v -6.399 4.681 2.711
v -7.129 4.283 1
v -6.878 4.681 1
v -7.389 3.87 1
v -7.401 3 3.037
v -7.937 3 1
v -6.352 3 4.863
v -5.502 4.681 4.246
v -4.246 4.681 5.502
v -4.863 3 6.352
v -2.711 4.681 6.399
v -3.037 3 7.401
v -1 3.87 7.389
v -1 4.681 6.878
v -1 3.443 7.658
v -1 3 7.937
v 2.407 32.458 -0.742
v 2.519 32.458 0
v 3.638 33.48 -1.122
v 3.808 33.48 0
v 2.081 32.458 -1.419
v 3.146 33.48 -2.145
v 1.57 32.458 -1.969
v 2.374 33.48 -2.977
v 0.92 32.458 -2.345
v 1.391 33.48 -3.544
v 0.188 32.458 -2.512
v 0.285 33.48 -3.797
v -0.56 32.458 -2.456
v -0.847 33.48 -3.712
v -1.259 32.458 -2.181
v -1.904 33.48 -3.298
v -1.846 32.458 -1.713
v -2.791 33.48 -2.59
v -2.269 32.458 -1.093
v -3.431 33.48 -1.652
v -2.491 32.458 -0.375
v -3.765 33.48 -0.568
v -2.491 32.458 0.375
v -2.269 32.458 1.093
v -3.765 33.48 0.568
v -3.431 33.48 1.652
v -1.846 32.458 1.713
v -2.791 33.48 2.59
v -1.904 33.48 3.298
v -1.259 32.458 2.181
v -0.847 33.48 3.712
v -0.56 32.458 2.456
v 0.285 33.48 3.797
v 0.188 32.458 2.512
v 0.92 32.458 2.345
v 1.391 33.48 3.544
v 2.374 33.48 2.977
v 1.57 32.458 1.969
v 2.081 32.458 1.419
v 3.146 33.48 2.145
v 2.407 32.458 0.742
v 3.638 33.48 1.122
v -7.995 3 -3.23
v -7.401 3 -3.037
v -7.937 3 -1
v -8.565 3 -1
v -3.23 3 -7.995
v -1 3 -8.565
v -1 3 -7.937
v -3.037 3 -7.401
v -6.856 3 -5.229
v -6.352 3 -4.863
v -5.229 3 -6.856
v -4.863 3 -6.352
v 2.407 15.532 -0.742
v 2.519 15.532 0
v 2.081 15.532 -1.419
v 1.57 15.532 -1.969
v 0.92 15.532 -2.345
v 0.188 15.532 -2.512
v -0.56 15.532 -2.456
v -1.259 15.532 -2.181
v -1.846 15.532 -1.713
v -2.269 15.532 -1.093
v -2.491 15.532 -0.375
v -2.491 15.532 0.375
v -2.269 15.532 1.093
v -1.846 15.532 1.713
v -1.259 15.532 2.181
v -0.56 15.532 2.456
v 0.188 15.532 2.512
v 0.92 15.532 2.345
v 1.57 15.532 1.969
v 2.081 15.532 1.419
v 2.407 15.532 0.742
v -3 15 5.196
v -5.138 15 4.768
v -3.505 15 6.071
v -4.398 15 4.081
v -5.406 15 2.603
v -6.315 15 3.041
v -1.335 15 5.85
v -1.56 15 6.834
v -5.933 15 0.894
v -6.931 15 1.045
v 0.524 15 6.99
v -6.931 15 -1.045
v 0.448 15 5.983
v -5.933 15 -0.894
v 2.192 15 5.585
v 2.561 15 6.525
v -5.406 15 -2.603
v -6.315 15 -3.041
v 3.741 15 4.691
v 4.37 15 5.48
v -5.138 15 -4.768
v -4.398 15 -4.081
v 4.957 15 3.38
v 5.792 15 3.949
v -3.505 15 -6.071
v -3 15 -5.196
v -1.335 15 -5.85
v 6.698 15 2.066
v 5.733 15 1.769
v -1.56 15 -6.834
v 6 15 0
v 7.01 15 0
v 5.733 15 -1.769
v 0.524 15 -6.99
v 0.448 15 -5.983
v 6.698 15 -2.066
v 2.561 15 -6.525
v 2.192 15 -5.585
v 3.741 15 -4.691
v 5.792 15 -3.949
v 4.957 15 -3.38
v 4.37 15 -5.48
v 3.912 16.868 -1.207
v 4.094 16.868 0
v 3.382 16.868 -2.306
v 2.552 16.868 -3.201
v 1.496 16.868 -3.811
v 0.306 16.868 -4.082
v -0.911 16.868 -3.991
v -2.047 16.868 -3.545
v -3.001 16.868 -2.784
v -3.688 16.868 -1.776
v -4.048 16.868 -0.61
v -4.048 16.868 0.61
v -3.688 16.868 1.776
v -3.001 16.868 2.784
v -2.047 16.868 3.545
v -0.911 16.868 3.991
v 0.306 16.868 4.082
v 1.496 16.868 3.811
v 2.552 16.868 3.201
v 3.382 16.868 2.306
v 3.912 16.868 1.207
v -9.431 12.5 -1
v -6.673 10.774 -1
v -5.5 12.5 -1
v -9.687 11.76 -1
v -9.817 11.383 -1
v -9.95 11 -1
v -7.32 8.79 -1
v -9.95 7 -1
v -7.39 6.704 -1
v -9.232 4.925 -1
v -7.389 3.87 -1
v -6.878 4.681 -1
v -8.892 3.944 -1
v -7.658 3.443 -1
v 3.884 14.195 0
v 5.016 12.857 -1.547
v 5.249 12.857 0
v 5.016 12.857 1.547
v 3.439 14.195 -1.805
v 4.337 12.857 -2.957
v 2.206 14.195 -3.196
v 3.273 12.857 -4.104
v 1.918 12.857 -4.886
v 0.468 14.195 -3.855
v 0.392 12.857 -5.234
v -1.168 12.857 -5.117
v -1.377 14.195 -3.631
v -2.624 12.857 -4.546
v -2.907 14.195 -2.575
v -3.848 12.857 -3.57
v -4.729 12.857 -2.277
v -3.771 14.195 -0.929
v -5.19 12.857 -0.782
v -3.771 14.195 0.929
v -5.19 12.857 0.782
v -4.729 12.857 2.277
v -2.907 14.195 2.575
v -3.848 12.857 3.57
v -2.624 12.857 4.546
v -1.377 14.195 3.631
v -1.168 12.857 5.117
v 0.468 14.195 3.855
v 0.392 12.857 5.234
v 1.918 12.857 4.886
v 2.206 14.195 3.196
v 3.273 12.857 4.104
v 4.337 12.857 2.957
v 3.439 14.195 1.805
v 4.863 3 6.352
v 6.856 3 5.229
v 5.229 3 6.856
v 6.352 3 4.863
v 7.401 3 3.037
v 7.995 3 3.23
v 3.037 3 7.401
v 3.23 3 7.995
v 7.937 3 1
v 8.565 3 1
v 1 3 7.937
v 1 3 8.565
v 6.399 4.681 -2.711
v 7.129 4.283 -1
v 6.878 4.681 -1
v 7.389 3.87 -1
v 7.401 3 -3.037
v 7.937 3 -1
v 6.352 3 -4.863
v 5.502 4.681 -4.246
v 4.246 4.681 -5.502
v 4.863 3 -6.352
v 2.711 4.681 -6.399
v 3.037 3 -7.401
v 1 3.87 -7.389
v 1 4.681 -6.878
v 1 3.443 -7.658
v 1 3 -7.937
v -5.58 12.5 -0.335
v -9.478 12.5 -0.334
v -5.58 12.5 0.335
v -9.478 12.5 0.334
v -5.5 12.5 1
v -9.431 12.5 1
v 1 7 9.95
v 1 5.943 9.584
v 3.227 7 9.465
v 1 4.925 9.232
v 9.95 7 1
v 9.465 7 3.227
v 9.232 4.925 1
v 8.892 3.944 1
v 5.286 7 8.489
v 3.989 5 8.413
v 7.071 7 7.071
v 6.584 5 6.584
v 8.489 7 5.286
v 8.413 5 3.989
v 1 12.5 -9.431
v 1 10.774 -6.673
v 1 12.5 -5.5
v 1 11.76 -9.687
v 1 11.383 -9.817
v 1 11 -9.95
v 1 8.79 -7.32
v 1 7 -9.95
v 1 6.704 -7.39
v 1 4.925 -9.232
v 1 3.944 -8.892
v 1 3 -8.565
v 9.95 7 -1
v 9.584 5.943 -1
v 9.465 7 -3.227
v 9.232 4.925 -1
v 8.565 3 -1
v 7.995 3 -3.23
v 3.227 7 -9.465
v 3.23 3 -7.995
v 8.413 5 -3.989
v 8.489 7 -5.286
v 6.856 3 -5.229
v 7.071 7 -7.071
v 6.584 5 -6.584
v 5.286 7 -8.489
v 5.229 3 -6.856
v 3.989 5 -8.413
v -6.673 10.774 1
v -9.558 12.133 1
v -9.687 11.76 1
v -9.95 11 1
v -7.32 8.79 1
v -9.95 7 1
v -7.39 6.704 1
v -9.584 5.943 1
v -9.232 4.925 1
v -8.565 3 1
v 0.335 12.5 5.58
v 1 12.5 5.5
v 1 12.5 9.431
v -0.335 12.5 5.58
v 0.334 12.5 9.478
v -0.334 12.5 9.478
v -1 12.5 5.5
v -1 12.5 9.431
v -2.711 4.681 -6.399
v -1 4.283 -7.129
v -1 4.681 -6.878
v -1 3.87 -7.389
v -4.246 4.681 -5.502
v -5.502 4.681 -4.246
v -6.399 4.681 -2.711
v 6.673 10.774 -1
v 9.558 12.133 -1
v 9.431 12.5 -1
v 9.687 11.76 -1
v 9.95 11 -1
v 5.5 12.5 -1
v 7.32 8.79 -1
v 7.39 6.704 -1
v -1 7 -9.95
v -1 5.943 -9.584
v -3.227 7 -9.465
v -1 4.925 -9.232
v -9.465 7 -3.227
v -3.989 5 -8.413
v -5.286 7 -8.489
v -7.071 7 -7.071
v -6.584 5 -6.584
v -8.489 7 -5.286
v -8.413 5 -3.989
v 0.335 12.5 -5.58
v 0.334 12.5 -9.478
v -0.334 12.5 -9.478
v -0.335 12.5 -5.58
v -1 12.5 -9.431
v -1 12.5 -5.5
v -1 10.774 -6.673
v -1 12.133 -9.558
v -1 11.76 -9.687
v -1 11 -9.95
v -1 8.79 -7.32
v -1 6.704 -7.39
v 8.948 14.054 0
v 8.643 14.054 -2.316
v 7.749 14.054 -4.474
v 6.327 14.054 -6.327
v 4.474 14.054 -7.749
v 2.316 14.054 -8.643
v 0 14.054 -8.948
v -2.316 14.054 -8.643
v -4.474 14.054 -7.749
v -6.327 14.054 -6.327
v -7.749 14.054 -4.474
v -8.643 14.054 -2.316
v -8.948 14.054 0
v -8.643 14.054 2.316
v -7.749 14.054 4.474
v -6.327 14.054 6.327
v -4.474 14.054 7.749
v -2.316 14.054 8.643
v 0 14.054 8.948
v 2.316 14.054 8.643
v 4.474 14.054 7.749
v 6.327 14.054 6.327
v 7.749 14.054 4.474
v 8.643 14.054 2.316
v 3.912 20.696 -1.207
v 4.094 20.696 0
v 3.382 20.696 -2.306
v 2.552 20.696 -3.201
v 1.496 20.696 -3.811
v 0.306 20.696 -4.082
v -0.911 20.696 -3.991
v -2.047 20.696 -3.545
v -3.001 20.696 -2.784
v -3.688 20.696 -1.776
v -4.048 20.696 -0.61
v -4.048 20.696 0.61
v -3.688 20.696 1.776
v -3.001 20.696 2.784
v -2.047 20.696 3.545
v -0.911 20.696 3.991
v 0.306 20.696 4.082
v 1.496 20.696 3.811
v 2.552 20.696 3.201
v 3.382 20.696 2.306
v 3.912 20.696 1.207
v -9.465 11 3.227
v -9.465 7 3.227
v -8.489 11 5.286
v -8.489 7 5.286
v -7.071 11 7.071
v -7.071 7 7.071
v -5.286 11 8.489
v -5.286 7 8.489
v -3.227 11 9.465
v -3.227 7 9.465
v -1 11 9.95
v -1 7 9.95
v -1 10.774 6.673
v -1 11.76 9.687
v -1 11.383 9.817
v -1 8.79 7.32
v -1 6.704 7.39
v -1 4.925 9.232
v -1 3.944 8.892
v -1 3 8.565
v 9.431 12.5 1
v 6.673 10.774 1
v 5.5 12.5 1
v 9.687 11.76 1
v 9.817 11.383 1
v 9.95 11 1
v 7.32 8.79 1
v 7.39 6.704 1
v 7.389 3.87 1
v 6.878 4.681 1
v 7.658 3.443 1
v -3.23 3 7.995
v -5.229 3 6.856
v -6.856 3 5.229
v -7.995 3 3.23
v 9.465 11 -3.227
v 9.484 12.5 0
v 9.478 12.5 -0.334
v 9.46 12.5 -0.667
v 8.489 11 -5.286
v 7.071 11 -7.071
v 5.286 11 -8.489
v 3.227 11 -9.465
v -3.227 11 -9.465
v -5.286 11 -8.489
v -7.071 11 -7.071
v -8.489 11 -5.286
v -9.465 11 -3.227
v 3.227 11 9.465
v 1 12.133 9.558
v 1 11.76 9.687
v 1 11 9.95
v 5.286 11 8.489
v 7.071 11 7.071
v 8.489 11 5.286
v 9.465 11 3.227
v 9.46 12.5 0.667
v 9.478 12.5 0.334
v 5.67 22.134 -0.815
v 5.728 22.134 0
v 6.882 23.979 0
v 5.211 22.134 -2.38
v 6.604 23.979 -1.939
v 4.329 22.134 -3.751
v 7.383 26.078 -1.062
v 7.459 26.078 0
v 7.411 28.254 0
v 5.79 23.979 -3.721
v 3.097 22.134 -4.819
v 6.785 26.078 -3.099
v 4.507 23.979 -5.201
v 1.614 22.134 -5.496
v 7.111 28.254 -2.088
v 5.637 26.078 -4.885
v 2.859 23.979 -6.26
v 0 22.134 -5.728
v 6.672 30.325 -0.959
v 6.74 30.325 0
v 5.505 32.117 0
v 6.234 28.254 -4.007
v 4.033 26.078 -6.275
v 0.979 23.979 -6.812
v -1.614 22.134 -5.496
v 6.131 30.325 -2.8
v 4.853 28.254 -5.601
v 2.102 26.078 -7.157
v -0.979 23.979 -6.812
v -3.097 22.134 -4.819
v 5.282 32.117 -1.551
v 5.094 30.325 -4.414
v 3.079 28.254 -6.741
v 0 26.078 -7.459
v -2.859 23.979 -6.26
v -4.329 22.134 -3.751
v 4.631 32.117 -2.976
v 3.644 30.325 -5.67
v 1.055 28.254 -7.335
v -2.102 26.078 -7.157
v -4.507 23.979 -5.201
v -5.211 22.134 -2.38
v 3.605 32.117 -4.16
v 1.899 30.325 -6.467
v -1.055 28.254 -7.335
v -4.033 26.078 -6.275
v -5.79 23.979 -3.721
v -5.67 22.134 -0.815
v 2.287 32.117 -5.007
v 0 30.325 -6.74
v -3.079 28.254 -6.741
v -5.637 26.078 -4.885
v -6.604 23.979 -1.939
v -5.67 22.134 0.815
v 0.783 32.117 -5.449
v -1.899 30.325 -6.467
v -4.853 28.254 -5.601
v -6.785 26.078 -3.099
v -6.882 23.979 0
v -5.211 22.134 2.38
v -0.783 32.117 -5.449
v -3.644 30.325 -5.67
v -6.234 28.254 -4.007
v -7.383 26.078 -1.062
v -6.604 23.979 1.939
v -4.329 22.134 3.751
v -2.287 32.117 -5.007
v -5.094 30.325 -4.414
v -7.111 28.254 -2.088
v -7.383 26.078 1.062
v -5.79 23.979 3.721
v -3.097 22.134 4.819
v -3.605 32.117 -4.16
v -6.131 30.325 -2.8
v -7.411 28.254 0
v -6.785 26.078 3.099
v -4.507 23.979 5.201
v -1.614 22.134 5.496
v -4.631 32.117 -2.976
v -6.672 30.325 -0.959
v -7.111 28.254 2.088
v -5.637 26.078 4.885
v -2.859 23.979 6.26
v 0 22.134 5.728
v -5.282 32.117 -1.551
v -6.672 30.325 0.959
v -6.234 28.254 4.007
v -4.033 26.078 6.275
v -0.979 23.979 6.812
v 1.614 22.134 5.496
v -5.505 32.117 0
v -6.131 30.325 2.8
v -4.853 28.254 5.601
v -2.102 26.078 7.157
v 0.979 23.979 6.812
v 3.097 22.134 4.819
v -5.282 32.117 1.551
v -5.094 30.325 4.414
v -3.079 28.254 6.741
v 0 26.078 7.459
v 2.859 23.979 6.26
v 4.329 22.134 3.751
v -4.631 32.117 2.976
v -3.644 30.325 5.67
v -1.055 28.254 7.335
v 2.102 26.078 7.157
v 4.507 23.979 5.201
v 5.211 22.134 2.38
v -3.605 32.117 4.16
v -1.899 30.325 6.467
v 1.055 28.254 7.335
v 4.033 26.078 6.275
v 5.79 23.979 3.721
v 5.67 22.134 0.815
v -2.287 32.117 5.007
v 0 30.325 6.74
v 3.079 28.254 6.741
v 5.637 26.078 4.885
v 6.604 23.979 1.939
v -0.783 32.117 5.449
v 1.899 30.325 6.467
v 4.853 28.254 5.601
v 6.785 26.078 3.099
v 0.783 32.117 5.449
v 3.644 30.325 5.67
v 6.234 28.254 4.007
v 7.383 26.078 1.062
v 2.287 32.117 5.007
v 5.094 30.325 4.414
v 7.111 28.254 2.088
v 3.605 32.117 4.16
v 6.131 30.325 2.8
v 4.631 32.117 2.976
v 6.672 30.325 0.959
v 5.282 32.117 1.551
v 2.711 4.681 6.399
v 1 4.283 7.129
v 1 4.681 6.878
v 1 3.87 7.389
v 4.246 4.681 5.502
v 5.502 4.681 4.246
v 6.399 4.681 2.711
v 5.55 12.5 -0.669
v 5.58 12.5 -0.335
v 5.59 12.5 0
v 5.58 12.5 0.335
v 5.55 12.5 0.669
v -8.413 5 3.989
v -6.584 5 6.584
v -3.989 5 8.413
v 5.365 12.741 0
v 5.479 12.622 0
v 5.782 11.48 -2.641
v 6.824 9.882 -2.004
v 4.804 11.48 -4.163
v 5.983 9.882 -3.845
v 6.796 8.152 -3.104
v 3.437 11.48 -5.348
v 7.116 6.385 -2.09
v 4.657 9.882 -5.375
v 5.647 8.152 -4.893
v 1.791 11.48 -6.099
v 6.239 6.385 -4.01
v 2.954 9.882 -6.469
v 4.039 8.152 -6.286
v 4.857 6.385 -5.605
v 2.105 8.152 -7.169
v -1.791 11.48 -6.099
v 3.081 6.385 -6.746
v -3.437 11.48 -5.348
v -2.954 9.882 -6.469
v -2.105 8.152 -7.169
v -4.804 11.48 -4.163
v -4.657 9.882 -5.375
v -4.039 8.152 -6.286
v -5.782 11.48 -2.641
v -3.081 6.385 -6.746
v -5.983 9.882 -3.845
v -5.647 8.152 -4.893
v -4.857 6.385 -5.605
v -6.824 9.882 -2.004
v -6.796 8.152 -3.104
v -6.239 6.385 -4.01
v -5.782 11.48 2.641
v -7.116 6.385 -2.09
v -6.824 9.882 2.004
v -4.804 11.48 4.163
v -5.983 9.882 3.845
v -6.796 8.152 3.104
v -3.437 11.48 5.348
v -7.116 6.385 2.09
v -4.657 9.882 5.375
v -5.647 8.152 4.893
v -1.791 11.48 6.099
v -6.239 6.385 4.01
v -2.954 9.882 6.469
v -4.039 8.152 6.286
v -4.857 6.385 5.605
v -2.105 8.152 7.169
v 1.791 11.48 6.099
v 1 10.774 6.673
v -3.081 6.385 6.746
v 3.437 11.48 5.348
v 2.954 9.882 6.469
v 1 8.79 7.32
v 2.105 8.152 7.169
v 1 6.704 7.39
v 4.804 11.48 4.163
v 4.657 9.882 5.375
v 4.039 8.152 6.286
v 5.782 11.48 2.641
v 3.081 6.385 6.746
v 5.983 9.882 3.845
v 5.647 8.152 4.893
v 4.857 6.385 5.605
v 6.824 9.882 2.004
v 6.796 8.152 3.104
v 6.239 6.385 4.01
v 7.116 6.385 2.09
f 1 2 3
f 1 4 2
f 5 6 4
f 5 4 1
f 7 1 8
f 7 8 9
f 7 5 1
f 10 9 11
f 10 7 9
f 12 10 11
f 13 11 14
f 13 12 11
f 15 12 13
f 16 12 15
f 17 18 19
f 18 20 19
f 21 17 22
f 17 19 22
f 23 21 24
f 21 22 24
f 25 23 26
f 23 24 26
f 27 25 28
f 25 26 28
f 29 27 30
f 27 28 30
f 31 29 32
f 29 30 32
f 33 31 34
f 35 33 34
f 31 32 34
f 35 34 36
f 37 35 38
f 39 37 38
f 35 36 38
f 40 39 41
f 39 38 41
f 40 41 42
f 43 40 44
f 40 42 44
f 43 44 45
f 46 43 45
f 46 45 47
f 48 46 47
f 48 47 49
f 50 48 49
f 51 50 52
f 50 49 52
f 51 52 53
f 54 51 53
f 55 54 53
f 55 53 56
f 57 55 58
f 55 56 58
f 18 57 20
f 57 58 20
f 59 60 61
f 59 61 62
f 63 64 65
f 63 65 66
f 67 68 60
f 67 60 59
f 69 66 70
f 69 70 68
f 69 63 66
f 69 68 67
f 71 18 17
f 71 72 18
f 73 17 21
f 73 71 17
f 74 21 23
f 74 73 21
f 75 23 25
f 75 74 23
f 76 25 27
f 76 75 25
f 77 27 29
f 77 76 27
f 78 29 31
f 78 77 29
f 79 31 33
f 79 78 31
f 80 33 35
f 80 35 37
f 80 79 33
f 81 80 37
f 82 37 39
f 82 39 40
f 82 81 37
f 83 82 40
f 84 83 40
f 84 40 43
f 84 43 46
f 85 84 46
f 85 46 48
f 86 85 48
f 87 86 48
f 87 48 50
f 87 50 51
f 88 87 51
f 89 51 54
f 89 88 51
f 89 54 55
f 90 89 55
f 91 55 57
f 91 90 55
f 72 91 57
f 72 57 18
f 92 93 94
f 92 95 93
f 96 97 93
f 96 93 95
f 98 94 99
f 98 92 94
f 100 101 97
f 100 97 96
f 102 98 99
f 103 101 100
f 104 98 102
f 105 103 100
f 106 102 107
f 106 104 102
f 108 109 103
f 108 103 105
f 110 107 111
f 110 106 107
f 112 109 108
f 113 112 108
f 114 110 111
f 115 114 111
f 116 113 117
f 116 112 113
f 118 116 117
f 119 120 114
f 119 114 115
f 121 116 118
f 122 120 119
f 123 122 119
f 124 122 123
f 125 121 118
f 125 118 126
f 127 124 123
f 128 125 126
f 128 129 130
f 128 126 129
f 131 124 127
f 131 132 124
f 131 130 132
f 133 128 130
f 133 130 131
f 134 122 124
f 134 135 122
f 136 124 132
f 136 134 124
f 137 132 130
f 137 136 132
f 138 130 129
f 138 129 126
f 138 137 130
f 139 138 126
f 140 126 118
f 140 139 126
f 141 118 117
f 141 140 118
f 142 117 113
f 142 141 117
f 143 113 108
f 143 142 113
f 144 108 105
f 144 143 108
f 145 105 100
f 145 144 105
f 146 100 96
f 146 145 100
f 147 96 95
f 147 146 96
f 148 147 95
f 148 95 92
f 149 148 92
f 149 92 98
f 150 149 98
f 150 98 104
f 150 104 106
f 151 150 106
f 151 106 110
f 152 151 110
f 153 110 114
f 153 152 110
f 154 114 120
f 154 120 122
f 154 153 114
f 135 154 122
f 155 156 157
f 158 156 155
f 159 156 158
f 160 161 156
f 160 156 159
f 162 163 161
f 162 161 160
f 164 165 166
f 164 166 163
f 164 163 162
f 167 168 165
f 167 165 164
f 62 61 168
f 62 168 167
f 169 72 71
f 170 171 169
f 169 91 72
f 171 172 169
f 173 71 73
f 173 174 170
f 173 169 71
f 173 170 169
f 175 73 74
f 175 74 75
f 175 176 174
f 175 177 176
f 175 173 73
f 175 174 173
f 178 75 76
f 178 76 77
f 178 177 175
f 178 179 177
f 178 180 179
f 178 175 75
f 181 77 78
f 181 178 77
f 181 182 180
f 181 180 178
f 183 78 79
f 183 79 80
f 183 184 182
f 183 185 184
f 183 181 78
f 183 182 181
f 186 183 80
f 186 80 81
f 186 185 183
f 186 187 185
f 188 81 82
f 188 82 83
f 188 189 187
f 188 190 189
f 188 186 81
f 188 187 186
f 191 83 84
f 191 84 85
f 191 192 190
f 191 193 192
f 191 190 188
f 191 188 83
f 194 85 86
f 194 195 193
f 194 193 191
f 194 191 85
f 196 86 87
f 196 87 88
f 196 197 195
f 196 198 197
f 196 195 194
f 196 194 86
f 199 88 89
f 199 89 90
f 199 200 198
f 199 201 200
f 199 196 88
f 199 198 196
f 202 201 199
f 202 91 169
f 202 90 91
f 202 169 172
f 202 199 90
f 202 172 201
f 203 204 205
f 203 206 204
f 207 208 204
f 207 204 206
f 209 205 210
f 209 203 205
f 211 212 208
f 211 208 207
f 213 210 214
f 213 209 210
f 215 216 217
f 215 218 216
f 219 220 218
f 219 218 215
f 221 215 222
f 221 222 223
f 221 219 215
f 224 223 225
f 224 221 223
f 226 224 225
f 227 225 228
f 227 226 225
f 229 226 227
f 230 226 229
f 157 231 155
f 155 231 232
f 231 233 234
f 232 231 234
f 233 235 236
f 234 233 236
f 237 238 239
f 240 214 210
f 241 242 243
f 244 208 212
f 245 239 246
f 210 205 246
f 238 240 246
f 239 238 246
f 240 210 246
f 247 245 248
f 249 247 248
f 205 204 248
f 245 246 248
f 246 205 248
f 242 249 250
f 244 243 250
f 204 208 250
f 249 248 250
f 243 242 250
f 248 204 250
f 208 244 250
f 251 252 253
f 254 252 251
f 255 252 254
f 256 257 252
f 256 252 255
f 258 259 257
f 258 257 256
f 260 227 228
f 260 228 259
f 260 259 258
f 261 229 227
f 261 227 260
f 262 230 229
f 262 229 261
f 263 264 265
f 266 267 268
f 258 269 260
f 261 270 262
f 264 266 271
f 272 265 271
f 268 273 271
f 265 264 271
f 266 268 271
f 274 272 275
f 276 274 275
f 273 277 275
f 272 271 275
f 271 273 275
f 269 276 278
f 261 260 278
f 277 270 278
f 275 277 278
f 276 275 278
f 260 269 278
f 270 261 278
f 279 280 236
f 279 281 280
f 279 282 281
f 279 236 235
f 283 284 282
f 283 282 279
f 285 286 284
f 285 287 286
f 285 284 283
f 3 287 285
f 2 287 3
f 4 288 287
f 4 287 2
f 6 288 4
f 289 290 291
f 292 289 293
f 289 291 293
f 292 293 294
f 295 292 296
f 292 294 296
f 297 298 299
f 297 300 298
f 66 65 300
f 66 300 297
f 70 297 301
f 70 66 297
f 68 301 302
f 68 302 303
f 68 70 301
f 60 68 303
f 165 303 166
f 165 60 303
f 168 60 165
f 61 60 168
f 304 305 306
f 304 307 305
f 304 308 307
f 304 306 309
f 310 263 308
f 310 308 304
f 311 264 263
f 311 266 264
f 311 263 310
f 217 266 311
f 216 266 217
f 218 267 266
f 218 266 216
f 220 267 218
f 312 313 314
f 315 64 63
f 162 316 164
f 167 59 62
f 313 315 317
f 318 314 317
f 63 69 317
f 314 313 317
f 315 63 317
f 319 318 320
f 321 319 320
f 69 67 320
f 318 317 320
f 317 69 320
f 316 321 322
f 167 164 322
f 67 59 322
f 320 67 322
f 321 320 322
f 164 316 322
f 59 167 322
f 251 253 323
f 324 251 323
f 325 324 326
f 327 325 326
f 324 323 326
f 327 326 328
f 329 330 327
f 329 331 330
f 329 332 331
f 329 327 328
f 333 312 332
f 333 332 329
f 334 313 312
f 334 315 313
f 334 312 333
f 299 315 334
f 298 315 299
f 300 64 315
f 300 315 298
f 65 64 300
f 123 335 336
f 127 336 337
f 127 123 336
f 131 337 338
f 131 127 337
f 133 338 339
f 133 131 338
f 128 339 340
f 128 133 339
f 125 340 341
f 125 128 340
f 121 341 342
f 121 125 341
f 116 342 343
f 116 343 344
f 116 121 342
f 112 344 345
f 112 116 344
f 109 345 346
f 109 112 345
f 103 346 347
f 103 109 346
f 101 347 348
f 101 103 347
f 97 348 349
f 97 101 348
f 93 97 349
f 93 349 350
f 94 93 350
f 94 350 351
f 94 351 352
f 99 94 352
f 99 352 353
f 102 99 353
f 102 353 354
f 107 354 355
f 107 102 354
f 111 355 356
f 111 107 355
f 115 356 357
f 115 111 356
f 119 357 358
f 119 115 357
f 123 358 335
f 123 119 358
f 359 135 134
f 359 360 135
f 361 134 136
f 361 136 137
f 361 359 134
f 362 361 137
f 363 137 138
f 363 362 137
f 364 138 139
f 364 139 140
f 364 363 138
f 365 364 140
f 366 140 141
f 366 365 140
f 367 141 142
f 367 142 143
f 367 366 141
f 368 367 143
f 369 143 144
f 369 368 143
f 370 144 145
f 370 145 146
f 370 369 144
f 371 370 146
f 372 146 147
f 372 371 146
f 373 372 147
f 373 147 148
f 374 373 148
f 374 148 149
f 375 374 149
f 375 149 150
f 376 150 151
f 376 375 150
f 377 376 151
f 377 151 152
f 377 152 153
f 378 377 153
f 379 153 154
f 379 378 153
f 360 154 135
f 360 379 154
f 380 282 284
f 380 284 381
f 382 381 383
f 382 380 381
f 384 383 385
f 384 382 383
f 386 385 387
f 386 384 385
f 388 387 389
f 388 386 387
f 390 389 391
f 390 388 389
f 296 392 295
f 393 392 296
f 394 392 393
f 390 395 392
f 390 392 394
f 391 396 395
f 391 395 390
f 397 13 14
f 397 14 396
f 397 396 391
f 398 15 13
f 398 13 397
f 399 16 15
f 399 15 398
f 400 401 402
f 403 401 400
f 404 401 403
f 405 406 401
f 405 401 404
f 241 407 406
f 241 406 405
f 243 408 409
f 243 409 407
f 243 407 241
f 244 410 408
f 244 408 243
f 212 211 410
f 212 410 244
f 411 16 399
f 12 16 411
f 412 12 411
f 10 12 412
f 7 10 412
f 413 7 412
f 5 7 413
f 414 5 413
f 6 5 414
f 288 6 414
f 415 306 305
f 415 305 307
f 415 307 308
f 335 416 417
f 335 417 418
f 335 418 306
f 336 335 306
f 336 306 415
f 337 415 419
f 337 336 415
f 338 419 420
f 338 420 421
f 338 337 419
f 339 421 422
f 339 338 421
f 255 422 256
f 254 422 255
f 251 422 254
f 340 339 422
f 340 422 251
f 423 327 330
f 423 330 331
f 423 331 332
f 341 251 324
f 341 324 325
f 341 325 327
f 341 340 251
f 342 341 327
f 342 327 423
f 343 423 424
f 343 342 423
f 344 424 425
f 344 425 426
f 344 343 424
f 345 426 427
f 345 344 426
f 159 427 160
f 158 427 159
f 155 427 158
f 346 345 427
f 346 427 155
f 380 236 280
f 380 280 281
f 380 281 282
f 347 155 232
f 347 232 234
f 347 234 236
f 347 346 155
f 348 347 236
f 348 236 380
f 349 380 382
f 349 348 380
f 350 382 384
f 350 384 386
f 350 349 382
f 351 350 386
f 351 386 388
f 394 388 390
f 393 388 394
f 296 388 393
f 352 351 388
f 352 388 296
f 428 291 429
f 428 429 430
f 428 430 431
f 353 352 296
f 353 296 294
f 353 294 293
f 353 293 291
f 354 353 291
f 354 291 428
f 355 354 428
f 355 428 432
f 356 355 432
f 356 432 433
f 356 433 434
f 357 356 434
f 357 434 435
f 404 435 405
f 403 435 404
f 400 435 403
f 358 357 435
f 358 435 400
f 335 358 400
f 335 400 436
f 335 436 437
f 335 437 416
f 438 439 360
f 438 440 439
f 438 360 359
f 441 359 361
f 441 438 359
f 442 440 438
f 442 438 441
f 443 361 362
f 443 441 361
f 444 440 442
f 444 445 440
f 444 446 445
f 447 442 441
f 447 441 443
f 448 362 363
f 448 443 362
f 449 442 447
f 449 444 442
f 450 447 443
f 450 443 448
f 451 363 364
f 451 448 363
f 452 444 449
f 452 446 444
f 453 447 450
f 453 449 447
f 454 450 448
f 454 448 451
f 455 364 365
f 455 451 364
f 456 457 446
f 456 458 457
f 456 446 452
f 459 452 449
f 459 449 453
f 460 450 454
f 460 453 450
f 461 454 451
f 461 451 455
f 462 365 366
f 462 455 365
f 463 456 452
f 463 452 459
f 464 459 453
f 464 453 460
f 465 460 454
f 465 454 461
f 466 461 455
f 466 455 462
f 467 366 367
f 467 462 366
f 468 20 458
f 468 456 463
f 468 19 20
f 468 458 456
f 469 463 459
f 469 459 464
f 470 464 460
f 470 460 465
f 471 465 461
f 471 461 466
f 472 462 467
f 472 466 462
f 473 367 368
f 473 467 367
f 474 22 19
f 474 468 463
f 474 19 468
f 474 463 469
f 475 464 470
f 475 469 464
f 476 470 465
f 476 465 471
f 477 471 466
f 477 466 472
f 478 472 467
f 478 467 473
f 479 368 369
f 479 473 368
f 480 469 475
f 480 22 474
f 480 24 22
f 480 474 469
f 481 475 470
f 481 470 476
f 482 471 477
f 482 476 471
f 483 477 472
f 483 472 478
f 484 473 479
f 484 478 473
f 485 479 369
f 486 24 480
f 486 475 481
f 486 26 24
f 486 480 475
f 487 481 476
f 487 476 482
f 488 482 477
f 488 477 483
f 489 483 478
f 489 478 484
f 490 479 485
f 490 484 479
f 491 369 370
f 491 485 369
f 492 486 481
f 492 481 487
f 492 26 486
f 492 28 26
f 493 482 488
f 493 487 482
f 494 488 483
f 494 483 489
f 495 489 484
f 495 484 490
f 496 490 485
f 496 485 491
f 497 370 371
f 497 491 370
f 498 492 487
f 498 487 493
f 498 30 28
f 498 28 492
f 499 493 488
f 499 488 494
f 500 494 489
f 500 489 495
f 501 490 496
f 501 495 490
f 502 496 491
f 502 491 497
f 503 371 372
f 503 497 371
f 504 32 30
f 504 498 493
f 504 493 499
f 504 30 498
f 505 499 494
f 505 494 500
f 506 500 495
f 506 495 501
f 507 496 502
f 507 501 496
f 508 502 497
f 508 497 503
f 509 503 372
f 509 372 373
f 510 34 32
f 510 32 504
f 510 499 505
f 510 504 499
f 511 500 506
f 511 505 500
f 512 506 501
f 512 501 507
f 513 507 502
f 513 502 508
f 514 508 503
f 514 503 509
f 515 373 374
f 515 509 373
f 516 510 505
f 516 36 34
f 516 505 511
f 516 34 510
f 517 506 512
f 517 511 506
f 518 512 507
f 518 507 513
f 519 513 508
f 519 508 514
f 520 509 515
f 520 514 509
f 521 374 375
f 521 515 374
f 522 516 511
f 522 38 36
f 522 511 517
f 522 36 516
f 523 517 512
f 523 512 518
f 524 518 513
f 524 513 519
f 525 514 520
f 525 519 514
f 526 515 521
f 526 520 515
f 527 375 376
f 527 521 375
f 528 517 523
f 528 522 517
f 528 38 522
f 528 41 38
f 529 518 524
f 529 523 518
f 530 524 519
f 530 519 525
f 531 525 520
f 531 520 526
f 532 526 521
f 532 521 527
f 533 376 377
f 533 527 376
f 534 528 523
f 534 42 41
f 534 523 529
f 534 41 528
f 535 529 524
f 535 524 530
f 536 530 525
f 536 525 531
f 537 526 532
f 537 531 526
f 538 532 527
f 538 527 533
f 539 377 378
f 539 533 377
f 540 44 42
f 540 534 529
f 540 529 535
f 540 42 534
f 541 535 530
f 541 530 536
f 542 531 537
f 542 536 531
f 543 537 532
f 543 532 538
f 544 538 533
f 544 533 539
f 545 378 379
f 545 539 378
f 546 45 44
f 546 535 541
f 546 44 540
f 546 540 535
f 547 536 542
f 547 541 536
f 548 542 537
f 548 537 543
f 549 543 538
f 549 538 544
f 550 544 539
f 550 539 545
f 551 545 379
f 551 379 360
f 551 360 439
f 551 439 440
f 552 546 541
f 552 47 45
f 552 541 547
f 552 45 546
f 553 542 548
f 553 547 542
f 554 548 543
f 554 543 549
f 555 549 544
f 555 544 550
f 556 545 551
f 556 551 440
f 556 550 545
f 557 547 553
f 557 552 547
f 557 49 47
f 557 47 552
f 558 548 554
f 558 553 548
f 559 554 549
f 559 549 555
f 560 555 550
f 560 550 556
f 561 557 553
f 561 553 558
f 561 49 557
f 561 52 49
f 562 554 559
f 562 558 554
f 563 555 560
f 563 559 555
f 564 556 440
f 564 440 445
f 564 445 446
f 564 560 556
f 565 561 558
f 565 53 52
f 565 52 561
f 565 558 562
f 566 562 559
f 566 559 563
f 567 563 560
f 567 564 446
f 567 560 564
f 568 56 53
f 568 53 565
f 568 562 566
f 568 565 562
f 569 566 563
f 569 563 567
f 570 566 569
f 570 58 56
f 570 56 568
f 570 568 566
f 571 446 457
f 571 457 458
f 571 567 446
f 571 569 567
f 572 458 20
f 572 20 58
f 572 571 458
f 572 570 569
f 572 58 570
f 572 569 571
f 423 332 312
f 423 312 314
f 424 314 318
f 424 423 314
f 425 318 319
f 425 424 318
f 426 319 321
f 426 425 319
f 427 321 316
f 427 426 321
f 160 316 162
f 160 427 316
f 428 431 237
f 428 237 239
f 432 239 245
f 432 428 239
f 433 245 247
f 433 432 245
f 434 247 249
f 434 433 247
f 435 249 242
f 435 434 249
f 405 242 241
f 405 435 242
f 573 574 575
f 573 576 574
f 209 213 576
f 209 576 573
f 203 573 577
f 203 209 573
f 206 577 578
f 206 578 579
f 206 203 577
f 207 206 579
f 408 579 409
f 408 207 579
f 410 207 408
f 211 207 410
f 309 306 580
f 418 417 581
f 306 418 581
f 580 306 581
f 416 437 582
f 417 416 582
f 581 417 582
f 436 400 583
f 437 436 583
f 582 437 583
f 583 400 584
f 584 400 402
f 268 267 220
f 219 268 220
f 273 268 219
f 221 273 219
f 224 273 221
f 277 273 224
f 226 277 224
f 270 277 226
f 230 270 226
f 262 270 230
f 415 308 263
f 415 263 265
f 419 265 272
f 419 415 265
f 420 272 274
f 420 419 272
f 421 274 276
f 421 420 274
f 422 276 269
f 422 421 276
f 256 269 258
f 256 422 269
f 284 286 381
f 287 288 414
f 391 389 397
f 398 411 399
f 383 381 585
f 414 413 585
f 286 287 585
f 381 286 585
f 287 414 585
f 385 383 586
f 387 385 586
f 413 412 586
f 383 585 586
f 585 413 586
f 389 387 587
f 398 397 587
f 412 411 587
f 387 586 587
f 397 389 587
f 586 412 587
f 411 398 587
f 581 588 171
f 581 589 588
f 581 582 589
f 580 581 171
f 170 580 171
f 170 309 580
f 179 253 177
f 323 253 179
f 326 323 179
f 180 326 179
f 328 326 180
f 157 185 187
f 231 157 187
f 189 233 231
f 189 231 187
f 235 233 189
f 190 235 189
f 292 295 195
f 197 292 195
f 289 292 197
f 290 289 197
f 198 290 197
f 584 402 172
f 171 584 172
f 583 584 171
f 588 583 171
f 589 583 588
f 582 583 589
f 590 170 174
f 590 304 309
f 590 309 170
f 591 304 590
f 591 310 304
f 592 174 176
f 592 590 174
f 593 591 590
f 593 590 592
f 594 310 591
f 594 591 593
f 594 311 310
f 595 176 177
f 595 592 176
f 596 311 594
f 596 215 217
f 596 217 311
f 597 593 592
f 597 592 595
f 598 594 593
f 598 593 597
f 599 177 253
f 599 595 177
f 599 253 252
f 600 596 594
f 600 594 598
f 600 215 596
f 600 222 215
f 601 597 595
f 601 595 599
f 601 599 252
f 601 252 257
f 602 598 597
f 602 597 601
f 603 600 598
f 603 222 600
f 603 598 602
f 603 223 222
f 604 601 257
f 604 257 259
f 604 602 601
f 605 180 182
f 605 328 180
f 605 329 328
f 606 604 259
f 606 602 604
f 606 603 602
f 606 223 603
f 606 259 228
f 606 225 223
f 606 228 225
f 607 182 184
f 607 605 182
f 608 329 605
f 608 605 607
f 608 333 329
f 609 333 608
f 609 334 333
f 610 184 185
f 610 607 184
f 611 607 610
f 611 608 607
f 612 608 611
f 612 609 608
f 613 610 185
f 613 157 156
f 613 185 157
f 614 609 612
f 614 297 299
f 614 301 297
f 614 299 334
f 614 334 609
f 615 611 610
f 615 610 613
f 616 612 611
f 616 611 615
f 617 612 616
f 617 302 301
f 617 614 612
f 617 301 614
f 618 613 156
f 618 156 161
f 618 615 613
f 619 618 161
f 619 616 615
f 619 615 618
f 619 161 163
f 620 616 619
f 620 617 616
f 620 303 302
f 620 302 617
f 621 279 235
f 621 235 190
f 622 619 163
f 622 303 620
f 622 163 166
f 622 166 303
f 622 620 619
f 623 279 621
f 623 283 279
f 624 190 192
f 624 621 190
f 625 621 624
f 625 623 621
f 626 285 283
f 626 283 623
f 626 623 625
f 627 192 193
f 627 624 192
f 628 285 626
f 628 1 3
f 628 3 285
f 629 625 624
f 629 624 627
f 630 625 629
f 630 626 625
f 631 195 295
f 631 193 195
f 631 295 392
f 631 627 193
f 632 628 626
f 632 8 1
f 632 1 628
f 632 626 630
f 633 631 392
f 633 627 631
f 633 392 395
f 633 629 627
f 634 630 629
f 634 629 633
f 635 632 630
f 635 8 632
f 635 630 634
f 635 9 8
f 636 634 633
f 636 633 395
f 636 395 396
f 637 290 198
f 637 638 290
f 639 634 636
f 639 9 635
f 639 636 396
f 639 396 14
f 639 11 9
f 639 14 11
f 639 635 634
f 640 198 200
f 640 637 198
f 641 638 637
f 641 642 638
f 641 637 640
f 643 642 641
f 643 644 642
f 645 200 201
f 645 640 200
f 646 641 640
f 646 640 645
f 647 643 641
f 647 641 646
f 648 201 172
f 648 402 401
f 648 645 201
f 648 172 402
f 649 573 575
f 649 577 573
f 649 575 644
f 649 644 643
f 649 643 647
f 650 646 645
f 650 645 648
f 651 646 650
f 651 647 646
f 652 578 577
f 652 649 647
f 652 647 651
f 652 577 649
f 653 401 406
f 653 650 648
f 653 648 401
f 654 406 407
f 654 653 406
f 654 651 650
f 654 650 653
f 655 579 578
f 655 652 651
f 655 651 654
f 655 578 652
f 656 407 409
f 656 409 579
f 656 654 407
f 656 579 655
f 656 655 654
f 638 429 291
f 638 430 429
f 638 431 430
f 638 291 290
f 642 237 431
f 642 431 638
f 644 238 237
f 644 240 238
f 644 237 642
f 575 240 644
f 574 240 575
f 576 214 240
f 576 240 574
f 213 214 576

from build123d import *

# Parameters (mm, degrees)
FASE1_SIZE                      = 2
FASE2_SIZE                      = 4
FASE2_SIZE2                     = 1.377310453
FASE3_SIZE                      = 4
FASE3_SIZE2                     = 1.377310453
SCHNITT_LINEAR_AUSTRAGEN1_DEPTH = 9.5
FASE4_SIZE                      = 1
FASE4_SIZE2                     = 1.613032213
FASE5_SIZE                      = 1.623645291


with BuildPart() as part:
    # Skizze1 → Rotation1 (revolve)
    with BuildSketch(Plane.XY, mode=Mode.PRIVATE) as rotation1_sk:
        with BuildLine():
            Line((-2.51871264, 34.081541744), (-2.51871264, 15.53217569))
            Line((-2.51871264, 15.53217569), (-5.248906592, 12.857142857))
            ThreePointArc((-5.248906592, 12.857142857), (-7.478321416, 8.069832253), (-6, 3))
            Line((-6, 3), (-10, 3))
            Line((-10, 3), (-10, 15))
            Line((-10, 15), (-6, 15))
            Line((-6, 15), (-4.093652292, 16.867831662))
            Line((-4.093652292, 16.867831662), (-4.093652292, 20.696496392))
            ThreePointArc((-4.093652292, 20.696496392), (-7.464630082, 27.878319169), (-2.51871264, 34.081541744))
        make_face()
    revolve(rotation1_sk.sketch.rotate(Axis((0, 15, 0), (0, 1, 0)), 180), axis=Axis((0, 15, 0), (0, 1, 0)))

    # Fase1
    # the kernel refuses this chamfer: 2, 1.818354592 mm, written as the material it takes off along each edge
    with BuildSketch(Plane(origin=(0, 3, 0), x_dir=(1, 0, 0), z_dir=(0, 0, 1))) as fase1_piece_1:
        with BuildLine():
            Line((6.949872666, 1.680555032), (6 + FASE1_SIZE, 0))
            Line((6 + FASE1_SIZE, 0), (6, 0))
            ThreePointArc((6, 0), (6.538732617, 0.826449161), (6.949872666, 1.680555032))
        make_face()
    revolve(axis=Axis((0, 3, 0), (0, 1, 0)), mode=Mode.SUBTRACT)

    # Fase2
    fase2_edges = [part.edges().sort_by_distance(p)[0] for p in [
        (-10, 3, 0),
    ]]
    fase2_side = [part.faces().sort_by_distance(p)[0] for p in [
        (-10, 9, 0),
    ]]
    chamfer(fase2_edges, length=FASE2_SIZE, length2=FASE2_SIZE2, reference=fase2_side[0])

    # Fase3
    fase3_edges = [part.edges().sort_by_distance(p)[0] for p in [
        (-10, 15, 0),
    ]]
    fase3_side = [part.faces().sort_by_distance(p)[0] for p in [
        (-10, 11, 0),
    ]]
    chamfer(fase3_edges, length=FASE3_SIZE, length2=FASE3_SIZE2, reference=fase3_side[0])

    # Skizze2 → Schnitt-Linear austragen1 (cut)
    with BuildSketch(Plane.XZ.offset(-3)):
        Polygon((0, 10.698773164), (1, 10.698773164), (1, 1), (12.923434457, 1), (12.923434457, 0), (12.923434457, -1), (1, -1), (1, -10.815383619), (0, -10.815383619), (-1, -10.815383619), (-1, -1), (-10.582773881, -1), (-10.582773881, 0), (-10.582773881, 1), (-1, 1), (-1, 10.698773164), align=None)
    extrude(amount=-SCHNITT_LINEAR_AUSTRAGEN1_DEPTH, mode=Mode.SUBTRACT)

    # Fase4
    fase4_edges = [part.edges().sort_by_distance(p)[0] for p in [
        (-8.622689547, 15, 0),
    ]]
    fase4_side = [part.faces().sort_by_distance(p)[0] for p in [
        (-9.311344773, 13, 0),
    ]]
    chamfer(fase4_edges, length=FASE4_SIZE, length2=FASE4_SIZE2, reference=fase4_side[0])

    # Fase5
    # the kernel refuses this chamfer: 1.623645291, 1.5 mm, written as the material it takes off along each edge
    with BuildSketch(Plane(origin=(0, 34.081541744, 0), x_dir=(1, 0, 0), z_dir=(0, 0, 1))) as fase5_piece_1:
        with BuildLine():
            Line((2.51871264, -FASE5_SIZE), (3.807658871, -0.601273173))
            ThreePointArc((3.807658871, -0.601273173), (3.190605907, -0.276236403), (2.51871264, 0))
            Line((2.51871264, 0), (2.51871264, -FASE5_SIZE))
        make_face()
    revolve(axis=Axis((0, 34.081541744, 0), (0, 1, 0)), mode=Mode.SUBTRACT)


solid = part.part
